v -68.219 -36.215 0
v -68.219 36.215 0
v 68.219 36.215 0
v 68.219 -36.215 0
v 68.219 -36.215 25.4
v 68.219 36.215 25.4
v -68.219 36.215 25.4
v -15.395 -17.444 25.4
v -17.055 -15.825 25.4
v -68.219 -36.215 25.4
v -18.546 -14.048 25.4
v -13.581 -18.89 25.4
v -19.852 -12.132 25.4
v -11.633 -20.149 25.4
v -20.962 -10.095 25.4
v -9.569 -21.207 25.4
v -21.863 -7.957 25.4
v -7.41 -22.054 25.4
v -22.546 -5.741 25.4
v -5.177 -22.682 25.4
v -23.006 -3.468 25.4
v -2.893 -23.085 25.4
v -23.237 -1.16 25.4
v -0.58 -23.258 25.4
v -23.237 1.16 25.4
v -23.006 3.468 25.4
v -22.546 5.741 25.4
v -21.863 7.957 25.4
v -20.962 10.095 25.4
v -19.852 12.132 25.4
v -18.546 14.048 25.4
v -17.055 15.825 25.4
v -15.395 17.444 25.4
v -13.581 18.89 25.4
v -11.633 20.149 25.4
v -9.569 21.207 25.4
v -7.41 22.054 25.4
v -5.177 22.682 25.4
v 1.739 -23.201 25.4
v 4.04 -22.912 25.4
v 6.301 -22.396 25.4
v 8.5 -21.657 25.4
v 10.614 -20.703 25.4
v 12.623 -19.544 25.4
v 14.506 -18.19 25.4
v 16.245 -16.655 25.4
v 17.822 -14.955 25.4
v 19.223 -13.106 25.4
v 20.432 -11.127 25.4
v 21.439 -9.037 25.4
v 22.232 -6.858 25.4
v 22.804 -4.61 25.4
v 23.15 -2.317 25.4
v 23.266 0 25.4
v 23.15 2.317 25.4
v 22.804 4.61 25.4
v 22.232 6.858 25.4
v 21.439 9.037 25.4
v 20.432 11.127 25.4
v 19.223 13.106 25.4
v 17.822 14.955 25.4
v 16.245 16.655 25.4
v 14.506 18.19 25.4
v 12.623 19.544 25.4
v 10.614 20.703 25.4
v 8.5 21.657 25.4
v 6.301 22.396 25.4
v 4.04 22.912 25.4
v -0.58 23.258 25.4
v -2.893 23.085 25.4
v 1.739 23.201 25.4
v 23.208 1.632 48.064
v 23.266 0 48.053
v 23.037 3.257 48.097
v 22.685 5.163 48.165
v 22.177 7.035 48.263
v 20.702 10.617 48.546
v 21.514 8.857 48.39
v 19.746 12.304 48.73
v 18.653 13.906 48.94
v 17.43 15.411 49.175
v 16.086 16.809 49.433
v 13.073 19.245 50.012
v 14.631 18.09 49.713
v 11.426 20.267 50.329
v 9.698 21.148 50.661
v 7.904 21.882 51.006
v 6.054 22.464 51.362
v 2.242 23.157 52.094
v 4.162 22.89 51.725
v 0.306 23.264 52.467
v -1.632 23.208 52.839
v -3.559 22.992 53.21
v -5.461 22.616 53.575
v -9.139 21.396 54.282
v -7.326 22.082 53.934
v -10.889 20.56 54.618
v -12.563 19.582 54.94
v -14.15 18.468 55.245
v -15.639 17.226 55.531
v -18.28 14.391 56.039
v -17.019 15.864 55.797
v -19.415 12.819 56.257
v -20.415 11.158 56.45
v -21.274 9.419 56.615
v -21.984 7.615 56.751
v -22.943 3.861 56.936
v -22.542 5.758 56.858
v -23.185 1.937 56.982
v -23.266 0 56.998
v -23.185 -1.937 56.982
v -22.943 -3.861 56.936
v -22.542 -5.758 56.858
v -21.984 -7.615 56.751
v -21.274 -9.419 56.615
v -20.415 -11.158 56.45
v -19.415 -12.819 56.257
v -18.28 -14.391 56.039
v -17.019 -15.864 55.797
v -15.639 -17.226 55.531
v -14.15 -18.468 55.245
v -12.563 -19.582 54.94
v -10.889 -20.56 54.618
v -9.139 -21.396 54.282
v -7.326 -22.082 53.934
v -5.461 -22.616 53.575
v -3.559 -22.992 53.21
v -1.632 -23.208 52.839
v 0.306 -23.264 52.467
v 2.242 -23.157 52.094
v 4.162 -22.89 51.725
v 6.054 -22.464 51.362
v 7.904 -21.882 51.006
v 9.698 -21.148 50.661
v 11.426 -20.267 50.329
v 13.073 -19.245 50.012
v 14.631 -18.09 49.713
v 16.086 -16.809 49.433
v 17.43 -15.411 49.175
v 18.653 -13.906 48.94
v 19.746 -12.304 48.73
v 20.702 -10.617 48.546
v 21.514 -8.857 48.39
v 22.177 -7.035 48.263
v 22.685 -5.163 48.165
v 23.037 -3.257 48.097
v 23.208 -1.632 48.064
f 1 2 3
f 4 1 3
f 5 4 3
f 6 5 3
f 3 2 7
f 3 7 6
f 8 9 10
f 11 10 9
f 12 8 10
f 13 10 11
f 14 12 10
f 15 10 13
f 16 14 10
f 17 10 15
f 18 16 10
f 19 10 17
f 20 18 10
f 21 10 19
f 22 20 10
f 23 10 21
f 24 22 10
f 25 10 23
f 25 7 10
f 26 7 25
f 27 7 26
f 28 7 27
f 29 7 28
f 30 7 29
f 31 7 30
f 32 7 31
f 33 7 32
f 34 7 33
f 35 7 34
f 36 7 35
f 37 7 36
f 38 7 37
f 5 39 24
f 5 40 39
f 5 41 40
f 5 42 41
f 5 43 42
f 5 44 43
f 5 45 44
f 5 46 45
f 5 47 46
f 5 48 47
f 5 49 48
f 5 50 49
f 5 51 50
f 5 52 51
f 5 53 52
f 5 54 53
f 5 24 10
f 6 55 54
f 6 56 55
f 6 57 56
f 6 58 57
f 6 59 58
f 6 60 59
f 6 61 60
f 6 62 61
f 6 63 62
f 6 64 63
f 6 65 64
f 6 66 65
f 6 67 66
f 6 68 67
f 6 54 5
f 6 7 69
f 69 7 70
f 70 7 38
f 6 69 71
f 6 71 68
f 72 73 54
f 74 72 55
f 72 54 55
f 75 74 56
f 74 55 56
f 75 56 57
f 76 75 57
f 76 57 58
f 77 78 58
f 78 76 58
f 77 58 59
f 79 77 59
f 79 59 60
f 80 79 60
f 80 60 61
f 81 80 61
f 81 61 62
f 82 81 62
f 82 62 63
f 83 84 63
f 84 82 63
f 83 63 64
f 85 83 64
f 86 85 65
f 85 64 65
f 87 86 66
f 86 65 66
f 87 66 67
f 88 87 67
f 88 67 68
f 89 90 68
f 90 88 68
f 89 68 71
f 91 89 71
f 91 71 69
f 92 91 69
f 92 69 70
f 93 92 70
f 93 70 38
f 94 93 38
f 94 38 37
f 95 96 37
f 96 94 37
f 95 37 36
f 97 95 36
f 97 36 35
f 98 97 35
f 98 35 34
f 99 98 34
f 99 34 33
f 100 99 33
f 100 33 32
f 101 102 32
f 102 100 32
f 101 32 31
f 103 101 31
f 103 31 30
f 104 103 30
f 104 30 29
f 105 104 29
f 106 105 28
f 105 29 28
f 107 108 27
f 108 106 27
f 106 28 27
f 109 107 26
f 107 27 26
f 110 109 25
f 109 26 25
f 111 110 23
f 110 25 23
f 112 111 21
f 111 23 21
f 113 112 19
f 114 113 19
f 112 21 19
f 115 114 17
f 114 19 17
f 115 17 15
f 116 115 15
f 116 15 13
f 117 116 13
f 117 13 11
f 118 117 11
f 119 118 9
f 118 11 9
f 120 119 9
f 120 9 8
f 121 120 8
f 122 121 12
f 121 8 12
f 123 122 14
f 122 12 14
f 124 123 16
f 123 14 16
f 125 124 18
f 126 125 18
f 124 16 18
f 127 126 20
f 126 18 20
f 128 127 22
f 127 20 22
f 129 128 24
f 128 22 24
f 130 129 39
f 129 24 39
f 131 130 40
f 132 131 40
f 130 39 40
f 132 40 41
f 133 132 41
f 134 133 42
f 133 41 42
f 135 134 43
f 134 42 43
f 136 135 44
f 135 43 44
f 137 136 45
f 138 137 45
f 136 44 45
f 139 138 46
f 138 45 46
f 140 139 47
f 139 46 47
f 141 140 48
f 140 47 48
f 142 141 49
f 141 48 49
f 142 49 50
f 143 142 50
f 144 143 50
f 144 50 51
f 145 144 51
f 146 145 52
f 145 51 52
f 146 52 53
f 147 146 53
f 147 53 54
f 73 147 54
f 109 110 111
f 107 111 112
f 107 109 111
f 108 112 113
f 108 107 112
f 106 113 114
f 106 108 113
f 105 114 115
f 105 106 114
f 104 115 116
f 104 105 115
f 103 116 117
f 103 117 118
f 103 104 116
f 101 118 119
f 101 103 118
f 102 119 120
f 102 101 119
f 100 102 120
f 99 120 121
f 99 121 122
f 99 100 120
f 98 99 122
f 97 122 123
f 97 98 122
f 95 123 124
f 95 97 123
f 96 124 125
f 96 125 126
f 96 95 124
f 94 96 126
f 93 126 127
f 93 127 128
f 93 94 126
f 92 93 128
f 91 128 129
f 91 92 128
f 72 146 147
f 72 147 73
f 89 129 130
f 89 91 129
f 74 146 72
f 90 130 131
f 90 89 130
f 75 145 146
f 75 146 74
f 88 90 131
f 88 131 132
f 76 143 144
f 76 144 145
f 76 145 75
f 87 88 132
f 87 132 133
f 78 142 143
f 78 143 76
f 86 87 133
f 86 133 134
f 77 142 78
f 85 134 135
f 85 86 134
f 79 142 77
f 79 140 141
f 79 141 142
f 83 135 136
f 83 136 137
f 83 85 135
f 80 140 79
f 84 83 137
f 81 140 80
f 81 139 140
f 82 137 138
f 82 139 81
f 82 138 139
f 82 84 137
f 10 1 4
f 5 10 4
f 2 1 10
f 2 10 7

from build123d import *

# Parameters (mm, degrees)
F0_W          = 136.4381015301
F0_H          = 72.4301114678
F1_DEPTH      = 25.4
F2_R          = 23.2656169201
F3_DEPTH      = 36.322
F5_DEPTH      = 25.4
F5_DEPTH_BACK = 25.4


with BuildPart() as f1:
    # F0 (on Top) → F1 (new body)
    with BuildSketch(Plane.XY):
        Rectangle(F0_W, F0_H)
    extrude(amount=F1_DEPTH)

    # F2 (on face) → F3 (join)
    with BuildSketch(Plane.XY.offset(25.4)):
        Circle(F2_R)
    extrude(amount=F3_DEPTH)

    # F4 (on Front) → F5 (cut, two sides)
    with BuildSketch(Plane.XZ) as f5_sk:
        Polygon((54.1822127998, 69.6227326989), (-68.4997886419, 65.6924173236), (54.1822127998, 42.1105287969), align=None)
    extrude(amount=-F5_DEPTH, mode=Mode.SUBTRACT)
    extrude(f5_sk.sketch, amount=F5_DEPTH_BACK, mode=Mode.SUBTRACT)


solid = f1.part
